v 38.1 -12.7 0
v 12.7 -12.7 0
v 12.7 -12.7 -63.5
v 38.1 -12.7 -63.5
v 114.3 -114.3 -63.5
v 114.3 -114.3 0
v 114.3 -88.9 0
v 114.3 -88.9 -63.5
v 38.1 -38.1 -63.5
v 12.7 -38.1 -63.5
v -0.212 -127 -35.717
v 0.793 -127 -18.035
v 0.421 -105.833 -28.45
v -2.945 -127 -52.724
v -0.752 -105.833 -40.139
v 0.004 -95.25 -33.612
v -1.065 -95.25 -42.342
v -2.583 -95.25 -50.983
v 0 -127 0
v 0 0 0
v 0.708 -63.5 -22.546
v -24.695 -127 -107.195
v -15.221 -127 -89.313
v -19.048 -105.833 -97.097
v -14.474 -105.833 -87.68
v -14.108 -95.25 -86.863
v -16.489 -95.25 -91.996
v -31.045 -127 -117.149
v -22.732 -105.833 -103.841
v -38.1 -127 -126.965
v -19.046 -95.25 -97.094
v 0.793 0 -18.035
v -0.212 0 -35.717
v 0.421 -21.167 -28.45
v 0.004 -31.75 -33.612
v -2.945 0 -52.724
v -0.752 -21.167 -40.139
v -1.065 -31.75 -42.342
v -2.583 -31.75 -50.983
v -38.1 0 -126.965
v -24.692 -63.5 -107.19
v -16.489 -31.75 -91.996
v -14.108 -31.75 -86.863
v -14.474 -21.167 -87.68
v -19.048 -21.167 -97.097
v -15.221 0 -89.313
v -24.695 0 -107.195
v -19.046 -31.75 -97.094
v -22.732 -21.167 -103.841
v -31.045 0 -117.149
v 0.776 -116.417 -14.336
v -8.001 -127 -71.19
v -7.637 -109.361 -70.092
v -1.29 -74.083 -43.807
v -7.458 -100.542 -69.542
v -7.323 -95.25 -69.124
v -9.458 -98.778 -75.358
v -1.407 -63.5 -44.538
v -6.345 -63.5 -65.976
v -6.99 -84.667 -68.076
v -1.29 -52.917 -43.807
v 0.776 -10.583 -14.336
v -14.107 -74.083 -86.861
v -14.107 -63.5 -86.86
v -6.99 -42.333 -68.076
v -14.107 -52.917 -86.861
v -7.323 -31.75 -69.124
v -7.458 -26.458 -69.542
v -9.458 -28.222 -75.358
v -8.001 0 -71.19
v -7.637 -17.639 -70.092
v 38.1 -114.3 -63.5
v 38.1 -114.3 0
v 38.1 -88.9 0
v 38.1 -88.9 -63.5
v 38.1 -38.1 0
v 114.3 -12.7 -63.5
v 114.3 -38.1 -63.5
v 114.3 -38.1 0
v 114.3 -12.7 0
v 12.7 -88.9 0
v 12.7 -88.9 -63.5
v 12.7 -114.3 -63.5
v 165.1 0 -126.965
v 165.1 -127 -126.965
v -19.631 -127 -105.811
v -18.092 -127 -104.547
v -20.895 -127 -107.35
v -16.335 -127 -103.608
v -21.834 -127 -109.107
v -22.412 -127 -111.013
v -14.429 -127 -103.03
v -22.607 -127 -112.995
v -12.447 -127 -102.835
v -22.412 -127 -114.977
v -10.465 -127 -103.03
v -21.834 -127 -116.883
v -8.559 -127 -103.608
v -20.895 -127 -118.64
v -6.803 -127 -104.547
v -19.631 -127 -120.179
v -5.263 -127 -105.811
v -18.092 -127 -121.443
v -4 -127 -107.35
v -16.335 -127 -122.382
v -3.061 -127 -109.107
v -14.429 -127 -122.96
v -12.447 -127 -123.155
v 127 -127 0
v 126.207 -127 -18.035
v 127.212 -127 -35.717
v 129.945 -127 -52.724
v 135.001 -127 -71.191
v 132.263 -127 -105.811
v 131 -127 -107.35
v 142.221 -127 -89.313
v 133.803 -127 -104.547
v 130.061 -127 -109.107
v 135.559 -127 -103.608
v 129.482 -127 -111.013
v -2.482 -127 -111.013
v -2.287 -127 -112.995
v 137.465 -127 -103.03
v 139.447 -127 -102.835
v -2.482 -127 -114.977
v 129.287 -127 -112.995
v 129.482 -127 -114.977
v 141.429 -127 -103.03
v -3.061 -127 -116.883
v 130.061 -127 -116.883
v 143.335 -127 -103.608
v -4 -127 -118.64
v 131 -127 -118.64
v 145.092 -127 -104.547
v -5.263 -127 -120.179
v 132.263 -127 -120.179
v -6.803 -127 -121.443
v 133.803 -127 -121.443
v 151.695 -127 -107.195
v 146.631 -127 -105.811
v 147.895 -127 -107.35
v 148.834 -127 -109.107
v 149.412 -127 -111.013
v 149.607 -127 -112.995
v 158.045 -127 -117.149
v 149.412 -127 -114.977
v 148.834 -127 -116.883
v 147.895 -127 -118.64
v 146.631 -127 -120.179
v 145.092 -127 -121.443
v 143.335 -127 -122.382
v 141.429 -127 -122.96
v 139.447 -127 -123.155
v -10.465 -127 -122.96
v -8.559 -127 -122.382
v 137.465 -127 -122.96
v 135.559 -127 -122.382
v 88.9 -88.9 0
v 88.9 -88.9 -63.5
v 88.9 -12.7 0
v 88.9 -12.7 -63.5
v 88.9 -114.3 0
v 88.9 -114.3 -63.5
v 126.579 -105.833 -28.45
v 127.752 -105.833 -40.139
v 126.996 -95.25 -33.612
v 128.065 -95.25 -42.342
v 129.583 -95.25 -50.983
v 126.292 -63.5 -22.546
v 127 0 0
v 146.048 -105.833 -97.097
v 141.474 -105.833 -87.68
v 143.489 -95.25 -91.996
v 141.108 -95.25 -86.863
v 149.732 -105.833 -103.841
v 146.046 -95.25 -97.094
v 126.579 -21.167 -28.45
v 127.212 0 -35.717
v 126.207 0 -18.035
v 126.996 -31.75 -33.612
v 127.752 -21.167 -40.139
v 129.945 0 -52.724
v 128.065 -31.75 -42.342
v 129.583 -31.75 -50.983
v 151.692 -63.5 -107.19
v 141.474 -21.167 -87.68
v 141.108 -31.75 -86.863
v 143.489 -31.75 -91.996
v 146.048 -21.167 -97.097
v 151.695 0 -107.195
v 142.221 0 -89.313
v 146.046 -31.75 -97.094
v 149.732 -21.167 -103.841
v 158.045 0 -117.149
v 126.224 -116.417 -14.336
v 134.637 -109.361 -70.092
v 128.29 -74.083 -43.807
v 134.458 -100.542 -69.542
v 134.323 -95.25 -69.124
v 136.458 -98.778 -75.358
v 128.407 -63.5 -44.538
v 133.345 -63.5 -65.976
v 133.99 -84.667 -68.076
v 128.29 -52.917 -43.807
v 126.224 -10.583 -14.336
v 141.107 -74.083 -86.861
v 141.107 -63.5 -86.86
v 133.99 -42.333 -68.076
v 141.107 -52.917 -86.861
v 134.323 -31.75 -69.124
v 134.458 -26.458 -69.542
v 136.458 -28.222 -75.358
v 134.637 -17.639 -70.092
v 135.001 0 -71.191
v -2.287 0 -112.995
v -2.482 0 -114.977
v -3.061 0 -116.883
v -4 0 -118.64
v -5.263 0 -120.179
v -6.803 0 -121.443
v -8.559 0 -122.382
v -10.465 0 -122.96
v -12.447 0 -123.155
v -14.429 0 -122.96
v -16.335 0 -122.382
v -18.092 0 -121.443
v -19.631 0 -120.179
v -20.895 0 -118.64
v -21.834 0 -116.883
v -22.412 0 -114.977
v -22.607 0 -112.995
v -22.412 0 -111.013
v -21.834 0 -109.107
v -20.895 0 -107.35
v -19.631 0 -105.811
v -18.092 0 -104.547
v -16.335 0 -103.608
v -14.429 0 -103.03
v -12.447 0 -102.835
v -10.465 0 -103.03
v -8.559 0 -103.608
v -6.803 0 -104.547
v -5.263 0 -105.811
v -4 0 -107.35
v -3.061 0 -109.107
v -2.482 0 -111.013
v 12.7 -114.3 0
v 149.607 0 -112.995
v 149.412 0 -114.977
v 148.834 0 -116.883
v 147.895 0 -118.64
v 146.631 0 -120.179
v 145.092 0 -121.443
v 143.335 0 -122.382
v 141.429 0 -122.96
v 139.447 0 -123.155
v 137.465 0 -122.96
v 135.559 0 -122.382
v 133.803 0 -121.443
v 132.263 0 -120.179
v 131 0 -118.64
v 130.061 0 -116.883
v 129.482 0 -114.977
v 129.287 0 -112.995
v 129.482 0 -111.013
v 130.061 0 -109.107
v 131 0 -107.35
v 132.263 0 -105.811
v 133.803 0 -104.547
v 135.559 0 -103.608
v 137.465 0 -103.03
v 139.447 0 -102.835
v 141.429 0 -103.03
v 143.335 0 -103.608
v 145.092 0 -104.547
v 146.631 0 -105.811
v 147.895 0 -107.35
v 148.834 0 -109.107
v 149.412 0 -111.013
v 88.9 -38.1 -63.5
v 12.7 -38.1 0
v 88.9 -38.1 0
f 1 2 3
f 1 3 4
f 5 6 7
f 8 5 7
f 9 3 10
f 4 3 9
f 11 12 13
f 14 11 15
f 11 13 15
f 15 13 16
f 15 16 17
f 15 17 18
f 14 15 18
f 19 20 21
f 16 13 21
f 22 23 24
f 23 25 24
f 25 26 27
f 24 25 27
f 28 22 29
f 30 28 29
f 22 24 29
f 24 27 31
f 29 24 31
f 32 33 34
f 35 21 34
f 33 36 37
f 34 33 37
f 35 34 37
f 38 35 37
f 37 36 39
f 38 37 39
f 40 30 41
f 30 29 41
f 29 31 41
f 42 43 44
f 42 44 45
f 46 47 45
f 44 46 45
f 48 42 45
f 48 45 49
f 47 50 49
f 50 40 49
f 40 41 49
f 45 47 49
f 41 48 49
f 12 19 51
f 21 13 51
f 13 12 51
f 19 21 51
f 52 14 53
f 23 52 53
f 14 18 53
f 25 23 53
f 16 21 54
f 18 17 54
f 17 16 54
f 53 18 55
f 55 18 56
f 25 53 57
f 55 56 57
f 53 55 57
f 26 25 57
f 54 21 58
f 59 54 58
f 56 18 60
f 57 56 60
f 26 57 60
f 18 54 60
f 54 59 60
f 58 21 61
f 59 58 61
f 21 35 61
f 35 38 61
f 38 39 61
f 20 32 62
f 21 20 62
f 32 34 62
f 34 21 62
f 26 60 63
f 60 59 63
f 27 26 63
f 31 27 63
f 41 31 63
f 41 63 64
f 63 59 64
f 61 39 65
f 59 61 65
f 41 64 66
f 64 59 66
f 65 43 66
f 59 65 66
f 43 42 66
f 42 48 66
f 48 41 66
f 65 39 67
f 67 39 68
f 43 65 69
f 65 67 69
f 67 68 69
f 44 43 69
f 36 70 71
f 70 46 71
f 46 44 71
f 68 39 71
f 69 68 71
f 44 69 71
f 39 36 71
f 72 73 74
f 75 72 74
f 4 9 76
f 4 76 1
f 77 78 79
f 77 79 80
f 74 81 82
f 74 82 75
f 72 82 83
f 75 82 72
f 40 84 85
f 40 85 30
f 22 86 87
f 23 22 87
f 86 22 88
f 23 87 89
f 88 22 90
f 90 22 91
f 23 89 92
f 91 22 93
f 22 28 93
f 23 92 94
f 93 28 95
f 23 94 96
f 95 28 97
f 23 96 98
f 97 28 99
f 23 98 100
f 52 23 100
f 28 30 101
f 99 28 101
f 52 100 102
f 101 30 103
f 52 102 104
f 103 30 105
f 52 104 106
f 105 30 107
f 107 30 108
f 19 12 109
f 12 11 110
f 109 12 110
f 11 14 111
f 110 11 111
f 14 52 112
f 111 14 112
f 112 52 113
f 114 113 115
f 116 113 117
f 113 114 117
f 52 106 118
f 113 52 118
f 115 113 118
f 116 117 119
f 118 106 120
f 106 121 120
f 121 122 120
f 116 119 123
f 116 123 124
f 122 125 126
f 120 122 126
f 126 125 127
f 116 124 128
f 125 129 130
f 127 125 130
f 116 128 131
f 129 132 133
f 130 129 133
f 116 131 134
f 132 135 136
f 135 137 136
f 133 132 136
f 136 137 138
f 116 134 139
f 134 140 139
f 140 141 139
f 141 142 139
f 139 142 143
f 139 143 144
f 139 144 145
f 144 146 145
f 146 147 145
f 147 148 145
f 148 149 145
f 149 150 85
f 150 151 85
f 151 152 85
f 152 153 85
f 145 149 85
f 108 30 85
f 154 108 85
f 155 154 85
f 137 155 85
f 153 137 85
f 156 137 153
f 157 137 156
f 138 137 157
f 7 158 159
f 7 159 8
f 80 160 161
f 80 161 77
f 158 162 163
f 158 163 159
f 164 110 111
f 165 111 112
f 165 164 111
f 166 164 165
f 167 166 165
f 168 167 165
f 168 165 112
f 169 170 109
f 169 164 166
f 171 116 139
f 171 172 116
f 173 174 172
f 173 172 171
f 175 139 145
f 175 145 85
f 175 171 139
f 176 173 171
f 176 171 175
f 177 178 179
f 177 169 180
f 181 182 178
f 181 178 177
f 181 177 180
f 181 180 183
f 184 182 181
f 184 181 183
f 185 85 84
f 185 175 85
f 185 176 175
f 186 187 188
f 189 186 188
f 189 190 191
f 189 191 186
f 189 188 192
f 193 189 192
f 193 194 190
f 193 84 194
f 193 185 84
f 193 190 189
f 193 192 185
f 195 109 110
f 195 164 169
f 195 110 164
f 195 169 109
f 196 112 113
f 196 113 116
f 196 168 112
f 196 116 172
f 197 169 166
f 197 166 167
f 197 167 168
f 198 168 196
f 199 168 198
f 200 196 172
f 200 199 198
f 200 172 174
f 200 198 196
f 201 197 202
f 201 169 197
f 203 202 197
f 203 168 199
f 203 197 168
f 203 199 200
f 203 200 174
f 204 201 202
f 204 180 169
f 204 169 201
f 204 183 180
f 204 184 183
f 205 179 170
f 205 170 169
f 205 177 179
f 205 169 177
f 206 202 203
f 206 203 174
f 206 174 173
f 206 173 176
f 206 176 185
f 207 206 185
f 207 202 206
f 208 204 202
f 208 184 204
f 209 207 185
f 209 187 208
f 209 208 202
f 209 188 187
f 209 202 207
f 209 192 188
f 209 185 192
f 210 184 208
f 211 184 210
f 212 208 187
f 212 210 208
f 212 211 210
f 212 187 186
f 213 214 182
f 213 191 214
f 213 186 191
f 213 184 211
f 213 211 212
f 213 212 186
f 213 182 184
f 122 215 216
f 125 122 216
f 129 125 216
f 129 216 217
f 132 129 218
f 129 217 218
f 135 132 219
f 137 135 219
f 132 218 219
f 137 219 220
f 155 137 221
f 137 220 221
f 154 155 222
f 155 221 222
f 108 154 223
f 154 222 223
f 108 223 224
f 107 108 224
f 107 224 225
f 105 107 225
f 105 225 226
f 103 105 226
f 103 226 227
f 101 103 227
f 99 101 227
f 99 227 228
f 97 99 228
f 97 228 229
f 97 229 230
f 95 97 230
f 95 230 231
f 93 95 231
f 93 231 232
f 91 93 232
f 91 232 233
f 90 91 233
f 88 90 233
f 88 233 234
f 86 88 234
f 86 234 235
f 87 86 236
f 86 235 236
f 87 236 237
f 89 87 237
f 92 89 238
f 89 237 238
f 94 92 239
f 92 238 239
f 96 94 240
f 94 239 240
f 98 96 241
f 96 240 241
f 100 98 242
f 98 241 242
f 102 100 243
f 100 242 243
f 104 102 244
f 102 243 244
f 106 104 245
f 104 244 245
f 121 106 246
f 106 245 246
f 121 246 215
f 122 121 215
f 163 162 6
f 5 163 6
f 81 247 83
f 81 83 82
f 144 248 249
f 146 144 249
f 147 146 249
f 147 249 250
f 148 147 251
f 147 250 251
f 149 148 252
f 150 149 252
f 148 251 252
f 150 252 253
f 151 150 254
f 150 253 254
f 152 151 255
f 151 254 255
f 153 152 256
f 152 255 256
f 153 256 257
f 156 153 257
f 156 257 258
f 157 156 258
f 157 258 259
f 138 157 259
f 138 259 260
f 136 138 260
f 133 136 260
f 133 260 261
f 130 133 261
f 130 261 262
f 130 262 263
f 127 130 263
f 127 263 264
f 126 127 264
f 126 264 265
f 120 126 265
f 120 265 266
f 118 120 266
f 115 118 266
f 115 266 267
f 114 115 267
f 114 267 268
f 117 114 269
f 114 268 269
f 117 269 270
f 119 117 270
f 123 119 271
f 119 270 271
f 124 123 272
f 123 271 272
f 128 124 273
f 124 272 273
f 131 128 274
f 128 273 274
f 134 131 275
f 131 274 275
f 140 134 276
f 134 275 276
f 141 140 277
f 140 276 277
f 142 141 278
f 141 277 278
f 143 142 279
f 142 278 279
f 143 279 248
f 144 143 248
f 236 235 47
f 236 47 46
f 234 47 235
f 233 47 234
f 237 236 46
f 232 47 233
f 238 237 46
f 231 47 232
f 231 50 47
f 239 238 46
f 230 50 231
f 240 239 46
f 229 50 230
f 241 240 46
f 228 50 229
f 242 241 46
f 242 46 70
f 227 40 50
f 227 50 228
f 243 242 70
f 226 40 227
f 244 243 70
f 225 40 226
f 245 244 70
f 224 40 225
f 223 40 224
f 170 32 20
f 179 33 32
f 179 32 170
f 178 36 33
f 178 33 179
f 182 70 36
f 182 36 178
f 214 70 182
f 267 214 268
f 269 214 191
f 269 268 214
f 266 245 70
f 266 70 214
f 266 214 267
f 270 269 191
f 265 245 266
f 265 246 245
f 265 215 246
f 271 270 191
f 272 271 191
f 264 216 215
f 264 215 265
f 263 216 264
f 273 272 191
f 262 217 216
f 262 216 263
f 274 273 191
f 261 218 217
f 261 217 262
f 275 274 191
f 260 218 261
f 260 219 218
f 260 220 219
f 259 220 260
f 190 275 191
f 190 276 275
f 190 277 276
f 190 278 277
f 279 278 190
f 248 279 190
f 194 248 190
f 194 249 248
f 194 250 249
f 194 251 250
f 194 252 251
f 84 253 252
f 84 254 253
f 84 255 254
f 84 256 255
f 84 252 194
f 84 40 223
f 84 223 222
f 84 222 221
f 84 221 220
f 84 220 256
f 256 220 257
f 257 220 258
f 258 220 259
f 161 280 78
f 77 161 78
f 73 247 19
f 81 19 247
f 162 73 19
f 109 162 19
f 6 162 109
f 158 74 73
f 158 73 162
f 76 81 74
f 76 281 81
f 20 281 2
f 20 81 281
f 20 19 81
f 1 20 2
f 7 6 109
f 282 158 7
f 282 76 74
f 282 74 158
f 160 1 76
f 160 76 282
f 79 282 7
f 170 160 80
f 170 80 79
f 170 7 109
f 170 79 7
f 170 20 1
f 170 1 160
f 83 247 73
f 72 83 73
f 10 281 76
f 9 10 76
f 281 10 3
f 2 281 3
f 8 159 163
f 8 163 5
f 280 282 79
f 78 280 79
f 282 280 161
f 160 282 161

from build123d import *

# Parameters (mm, degrees)
BOSS_EXTRUDE1_DEPTH = 127
SKETCH3_W           = 25.4
SKETCH3_H           = 25.4
CUT_EXTRUDE1_DEPTH  = 63.5
SKETCH4_R           = 10.16
CUT_EXTRUDE2_DEPTH  = 128.0000001


with BuildPart() as part:
    # Sketch2 → Boss-Extrude1 (new body)
    with BuildSketch(Plane(origin=(0, 0, 0), x_dir=(1, 0, 0), z_dir=(0, 1, 0))):
        with BuildLine():
            Line((0, 0), (127, 0))
            add(Edge.make_bspline(
                [(127, 0), (120.640280387, 68.469919386), (165.1, 126.964946797)],
                knots=[0, 0, 0, 1, 1, 1], degree=2))
            Line((165.1, 126.964946797), (-38.1, 126.964946797))
            add(Edge.make_bspline(
                [(0, 0), (6.359730642, 68.469923757), (-38.1, 126.964946797)],
                knots=[0, 0, 0, 1, 1, 1], degree=2))
        make_face()
    extrude(amount=-BOSS_EXTRUDE1_DEPTH)

    # Sketch3 → Cut-Extrude1 (cut)
    with BuildSketch(Plane.XY):
        with Locations((25.4, -25.4)):
            Rectangle(SKETCH3_W, SKETCH3_H)
        with Locations((25.4, -101.6)):
            Rectangle(SKETCH3_W, SKETCH3_H)
        with Locations((101.6, -25.4)):
            Rectangle(SKETCH3_W, SKETCH3_H)
        with Locations((101.6, -101.6)):
            Rectangle(SKETCH3_W, SKETCH3_H)
    extrude(amount=-CUT_EXTRUDE1_DEPTH, mode=Mode.SUBTRACT)

    # Sketch4 → Cut-Extrude2 (cut, through all)
    with BuildSketch(Plane(origin=(0, 0, 0), x_dir=(1, 0, 0), z_dir=(0, 1, 0))):
        with Locations((-12.447257457, 112.994946797)):
            Circle(SKETCH4_R)
        with Locations((139.447257457, 112.994946797)):
            Circle(SKETCH4_R)
    extrude(amount=-CUT_EXTRUDE2_DEPTH, mode=Mode.SUBTRACT)


solid = part.part
